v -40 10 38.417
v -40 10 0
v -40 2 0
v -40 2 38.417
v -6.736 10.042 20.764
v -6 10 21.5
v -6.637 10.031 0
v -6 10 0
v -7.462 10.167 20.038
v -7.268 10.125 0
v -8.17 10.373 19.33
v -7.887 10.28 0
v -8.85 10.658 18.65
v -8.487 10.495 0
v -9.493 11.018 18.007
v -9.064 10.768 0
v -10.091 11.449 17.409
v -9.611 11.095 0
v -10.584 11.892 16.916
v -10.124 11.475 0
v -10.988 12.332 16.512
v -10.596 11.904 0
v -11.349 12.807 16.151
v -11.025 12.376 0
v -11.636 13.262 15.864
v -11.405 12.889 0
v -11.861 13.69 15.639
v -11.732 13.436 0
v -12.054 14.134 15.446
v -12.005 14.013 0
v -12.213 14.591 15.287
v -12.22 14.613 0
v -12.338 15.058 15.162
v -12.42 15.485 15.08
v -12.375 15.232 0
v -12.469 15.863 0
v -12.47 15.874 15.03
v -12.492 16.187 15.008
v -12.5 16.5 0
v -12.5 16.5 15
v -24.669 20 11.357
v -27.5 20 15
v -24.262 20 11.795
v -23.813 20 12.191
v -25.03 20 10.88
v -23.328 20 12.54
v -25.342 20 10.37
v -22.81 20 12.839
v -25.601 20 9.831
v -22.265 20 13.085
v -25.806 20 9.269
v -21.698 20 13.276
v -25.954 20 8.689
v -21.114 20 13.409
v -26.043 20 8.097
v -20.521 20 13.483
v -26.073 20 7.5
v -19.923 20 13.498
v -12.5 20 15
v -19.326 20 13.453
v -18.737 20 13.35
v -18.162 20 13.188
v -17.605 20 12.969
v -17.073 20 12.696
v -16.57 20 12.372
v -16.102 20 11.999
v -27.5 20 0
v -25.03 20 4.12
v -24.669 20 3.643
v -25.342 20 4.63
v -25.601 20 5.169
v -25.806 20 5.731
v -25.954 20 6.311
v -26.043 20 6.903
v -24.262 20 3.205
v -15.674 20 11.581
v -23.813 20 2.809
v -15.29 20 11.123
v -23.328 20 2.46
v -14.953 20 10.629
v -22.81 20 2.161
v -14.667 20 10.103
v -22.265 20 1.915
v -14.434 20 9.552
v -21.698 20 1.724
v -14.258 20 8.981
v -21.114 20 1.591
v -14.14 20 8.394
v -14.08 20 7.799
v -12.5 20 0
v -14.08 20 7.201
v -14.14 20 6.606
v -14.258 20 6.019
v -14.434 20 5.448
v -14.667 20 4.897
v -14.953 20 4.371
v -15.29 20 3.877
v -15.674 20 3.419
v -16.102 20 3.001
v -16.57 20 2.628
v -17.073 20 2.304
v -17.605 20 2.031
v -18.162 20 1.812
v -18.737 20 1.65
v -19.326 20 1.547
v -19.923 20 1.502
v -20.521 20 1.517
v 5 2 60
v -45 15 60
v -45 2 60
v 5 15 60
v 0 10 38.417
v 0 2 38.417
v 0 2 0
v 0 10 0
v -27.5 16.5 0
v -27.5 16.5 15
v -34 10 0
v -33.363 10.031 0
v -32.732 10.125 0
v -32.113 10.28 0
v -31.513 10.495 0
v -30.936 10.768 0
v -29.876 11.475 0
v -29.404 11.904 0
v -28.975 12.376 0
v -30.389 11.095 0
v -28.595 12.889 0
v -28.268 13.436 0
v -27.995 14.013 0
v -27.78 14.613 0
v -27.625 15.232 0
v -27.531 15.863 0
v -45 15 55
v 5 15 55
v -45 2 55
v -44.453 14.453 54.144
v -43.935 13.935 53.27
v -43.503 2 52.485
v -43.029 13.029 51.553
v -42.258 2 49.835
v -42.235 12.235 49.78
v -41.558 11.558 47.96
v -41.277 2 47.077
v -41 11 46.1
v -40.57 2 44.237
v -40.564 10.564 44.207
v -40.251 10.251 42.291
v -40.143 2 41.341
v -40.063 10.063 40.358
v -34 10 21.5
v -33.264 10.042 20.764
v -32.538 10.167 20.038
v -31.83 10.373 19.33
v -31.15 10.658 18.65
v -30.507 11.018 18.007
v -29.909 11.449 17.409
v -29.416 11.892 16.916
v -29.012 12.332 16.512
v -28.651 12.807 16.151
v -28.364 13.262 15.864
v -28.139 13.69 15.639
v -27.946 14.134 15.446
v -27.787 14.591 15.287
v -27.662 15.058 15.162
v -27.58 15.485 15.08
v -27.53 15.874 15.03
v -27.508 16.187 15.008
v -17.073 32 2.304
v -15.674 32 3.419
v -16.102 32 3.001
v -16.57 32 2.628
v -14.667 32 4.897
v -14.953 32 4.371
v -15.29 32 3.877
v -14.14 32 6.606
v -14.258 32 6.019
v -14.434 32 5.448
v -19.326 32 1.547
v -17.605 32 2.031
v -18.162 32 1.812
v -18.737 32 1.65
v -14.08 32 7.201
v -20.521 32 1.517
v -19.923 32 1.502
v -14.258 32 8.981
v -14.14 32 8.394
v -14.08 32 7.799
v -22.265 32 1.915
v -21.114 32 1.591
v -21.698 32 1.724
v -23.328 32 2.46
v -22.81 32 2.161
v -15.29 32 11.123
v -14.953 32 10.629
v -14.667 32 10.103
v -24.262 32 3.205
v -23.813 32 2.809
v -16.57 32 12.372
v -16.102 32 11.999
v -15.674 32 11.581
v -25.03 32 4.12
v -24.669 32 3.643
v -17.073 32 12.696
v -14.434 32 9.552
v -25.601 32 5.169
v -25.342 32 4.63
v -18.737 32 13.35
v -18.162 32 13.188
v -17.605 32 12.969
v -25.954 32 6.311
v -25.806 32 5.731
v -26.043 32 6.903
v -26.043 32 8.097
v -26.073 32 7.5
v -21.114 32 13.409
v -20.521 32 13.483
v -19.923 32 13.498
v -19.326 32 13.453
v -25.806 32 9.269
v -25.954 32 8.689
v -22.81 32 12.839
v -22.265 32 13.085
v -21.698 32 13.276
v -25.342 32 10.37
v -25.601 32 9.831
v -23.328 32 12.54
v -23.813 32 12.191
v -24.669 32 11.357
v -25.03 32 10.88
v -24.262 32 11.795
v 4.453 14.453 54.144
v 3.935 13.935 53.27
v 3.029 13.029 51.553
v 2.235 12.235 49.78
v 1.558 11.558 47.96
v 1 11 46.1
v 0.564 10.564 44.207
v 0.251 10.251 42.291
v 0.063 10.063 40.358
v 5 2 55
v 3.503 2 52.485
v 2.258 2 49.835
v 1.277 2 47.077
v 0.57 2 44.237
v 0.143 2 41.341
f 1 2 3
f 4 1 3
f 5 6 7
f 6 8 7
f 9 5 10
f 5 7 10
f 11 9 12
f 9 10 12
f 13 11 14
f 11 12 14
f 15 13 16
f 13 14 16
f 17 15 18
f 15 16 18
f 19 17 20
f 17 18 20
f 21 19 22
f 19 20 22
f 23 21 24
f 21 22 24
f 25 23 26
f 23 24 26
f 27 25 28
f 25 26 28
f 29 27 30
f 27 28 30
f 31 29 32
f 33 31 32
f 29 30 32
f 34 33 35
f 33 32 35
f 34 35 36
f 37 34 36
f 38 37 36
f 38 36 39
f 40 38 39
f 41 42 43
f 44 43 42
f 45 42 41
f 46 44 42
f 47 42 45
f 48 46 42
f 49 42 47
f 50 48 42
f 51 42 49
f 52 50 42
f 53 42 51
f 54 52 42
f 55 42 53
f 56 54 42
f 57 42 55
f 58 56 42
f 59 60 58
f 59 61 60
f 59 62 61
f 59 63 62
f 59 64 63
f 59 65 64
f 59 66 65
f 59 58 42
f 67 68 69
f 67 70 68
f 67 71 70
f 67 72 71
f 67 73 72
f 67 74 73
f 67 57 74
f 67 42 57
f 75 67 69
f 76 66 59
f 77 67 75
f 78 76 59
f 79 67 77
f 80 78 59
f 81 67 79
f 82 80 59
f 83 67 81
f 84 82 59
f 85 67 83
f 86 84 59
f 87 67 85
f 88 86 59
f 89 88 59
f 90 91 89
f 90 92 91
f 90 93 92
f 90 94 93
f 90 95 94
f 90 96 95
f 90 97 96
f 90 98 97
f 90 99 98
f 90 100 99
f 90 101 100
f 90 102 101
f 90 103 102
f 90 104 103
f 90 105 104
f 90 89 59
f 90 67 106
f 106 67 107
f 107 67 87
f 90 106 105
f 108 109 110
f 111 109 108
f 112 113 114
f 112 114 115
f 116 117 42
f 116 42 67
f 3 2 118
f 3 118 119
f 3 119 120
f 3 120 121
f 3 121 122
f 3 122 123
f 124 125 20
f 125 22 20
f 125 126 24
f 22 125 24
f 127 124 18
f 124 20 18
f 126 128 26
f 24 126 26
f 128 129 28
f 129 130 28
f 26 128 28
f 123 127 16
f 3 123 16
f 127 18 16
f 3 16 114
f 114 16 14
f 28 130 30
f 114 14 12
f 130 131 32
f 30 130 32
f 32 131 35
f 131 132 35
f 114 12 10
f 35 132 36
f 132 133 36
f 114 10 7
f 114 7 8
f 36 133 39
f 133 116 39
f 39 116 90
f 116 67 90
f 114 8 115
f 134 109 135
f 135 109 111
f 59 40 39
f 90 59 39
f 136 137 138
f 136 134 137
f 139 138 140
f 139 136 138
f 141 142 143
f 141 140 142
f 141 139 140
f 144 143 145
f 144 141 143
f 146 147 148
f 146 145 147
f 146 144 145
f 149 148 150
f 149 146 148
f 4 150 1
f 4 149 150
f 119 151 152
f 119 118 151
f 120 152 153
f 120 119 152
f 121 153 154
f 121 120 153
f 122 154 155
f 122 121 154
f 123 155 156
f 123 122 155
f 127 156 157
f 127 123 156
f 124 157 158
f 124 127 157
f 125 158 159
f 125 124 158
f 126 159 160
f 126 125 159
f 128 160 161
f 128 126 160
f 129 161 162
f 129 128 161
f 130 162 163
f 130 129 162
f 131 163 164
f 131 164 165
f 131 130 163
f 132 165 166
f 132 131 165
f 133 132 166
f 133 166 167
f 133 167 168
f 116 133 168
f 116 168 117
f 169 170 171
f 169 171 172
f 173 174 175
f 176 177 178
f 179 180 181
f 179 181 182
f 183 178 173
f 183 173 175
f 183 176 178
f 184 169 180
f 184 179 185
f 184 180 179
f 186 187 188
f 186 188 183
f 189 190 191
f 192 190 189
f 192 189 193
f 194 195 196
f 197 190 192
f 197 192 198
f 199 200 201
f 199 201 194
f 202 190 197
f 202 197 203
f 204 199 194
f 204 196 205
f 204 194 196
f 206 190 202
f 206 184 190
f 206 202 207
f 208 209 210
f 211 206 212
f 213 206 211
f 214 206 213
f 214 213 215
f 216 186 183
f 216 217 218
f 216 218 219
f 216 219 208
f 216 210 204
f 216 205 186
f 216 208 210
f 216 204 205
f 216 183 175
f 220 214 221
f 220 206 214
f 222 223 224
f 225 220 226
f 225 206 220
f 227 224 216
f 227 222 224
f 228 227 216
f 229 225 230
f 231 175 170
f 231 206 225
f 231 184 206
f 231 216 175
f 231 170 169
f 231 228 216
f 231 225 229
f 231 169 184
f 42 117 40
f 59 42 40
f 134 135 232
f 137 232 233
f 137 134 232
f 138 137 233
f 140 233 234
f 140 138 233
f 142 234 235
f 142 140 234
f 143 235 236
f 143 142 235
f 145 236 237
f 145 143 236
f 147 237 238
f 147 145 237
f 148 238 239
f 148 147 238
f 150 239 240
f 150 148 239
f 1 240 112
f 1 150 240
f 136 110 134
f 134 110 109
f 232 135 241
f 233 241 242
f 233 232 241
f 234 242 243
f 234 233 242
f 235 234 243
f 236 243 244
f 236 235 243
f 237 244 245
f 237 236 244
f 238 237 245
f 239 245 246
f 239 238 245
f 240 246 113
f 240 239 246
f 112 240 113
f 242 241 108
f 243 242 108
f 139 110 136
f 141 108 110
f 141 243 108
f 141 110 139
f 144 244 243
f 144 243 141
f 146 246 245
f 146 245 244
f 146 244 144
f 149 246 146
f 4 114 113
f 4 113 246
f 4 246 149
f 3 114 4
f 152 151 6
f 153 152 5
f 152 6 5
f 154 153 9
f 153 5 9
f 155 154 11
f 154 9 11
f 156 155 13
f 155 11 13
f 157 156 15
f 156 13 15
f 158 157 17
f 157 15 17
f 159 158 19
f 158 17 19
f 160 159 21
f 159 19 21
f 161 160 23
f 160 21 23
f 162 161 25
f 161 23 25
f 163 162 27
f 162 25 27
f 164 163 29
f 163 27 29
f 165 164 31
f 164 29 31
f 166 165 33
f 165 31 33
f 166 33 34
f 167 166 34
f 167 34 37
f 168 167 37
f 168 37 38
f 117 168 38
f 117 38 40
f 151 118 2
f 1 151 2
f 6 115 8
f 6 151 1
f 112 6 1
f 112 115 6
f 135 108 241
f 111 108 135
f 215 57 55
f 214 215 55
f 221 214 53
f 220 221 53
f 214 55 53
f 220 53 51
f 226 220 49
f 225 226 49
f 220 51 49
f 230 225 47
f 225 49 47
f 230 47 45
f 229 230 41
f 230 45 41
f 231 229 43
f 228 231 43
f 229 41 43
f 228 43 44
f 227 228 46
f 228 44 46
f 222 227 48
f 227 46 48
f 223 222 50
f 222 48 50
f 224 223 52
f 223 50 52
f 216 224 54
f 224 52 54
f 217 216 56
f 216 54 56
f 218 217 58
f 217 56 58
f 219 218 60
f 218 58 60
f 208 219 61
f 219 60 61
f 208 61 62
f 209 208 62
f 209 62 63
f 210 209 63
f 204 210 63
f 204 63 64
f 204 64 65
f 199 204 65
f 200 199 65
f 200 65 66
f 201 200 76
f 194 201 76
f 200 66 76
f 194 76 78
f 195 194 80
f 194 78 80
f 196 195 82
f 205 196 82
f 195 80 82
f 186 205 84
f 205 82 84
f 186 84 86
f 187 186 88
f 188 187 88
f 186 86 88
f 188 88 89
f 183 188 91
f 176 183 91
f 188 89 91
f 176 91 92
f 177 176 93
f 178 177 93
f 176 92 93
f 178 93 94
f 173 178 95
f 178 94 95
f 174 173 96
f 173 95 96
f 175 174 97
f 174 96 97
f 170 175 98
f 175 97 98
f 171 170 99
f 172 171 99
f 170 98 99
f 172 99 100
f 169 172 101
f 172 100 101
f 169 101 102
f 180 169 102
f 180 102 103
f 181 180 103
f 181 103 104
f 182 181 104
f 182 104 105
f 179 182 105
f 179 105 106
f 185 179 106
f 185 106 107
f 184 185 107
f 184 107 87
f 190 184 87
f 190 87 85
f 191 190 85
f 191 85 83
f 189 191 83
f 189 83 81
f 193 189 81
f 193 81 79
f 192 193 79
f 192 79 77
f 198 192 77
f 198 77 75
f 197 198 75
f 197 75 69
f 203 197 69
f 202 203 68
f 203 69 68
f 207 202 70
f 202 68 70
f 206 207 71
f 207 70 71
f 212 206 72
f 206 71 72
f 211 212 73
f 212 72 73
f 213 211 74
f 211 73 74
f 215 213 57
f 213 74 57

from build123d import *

# Parameters (mm, degrees)
SKETCH5_W           = 40
SKETCH5_H           = 10
BOSS_EXTRUDE4_DEPTH = 60
SKETCH11_W          = 15
SKETCH11_H          = 15
BOSS_EXTRUDE6_DEPTH = 10
FILLET1_R           = 6.5
SKETCH14_W          = 50
SKETCH14_H          = 15
BOSS_EXTRUDE7_DEPTH = 5
FILLET2_R           = 30
SKETCH16_R          = 6
BOSS_EXTRUDE8_DEPTH = 12
SKETCH17_W          = 64.115547938
SKETCH17_H          = 89.863494167
CUT_EXTRUDE1_DEPTH  = 2


with BuildPart() as part:
    # Sketch5 → Boss-Extrude4 (new body)
    with BuildSketch(Plane.XY):
        with Locations((-20, 5)):
            Rectangle(SKETCH5_W, SKETCH5_H)
    extrude(amount=BOSS_EXTRUDE4_DEPTH)

    # Sketch11 → Boss-Extrude6 (add)
    with BuildSketch(Plane(origin=(0, 10, 0), x_dir=(1, 0, 0), z_dir=(0, 1, 0))):
        with Locations((-20, -7.5)):
            Rectangle(SKETCH11_W, SKETCH11_H)
    extrude(amount=BOSS_EXTRUDE6_DEPTH)

    # Fillet1
    fillet1_edges = [part.edges().sort_by_distance(p)[0] for p in [
        (-27.5, 10, 7.5),
        (-20, 10, 15),
        (-12.5, 10, 7.5),
    ]]
    fillet(fillet1_edges, radius=FILLET1_R)

    # Sketch14 → Boss-Extrude7 (add)
    with BuildSketch(Plane.XY.offset(60)):
        with Locations((-20, 7.5)):
            Rectangle(SKETCH14_W, SKETCH14_H)
    extrude(amount=-BOSS_EXTRUDE7_DEPTH)

    # Fillet2
    # the kernel refuses this fillet: 30 mm, written as the material it adds along each edge
    with BuildSketch(Plane(origin=(0, 10, 55), x_dir=(0, 0, -1), z_dir=(0, -1, 0))) as fillet2_piece_1:
        with BuildLine():
            CenterArc((16.583123952, 30), FILLET2_R, 236.442690238, 33.557309762)
            Line((0, 5), (-0.331662479, 4.5))
            ThreePointArc((-0.331662479, 4.5), (-0.6, 2.5), (-0.6, 0))
            Line((-0.6, 0), (0, -0.6))
            Line((0, -0.6), (16.583123952, -0.6))
            Line((16.583123952, -0.6), (16.583123952, 0))
        make_face()
    extrude(amount=10)
    with BuildSketch(Plane(origin=(-40, 10, 55), x_dir=(0, 1, 0), z_dir=(1, 0, 0))) as fillet2_piece_2:
        with BuildLine():
            CenterArc((30, -16.583123952), FILLET2_R, 146.442690238, 33.557309762)
            Line((0, -16.583123952), (-0.6, -16.583123952))
            Line((-0.6, -16.583123952), (-0.6, 0))
            Line((-0.6, 0), (0, 0.6))
            ThreePointArc((0, 0.6), (2.5, 0.6), (4.5, 0.331662479))
            Line((4.5, 0.331662479), (5, 0))
        make_face()
    extrude(amount=40)
    with BuildSketch(Plane(origin=(-40, 0, 55), x_dir=(-1, 0, 0), z_dir=(0, 1, 0))) as fillet2_piece_3:
        with BuildLine():
            CenterArc((30, -16.583123952), FILLET2_R, 146.442690238, 33.557309762)
            Line((0, -16.583123952), (-0.6, -16.583123952))
            Line((-0.6, -16.583123952), (-0.6, 0))
            Line((-0.6, 0), (0, 0.6))
            ThreePointArc((0, 0.6), (2.5, 0.6), (4.5, 0.331662479))
            Line((4.5, 0.331662479), (5, 0))
        make_face()
    extrude(amount=10)
    with BuildSketch(Plane(origin=(0, 51.457809879, 55), x_dir=(0, 0, -1), z_dir=(0, -1, 0))) as fillet2_piece_4a_section:
        with BuildLine():
            CenterArc((16.583123952, 30), FILLET2_R, 236.442690238, 33.557309762)
            Line((0, 5), (-0.331662479, 4.5))
            ThreePointArc((-0.331662479, 4.5), (-0.6, 2.5), (-0.6, 0))
            Line((-0.6, 0), (0, -0.6))
            Line((0, -0.6), (16.583123952, -0.6))
            Line((16.583123952, -0.6), (16.583123952, 0))
        make_face()
    fillet2_piece_4a = extrude(amount=51.457809879, mode=Mode.PRIVATE)
    fillet2_piece_4a = split(fillet2_piece_4a, bisect_by=Plane(origin=(1.065152115, 10, 50.172088022), z_dir=(0, 1, 0)), keep=Keep.TOP, mode=Mode.PRIVATE)
    fillet2_piece_4a = split(fillet2_piece_4a, bisect_by=Plane(origin=(1.065152115, 15, 50.172088022), z_dir=(0, -1, 0)), keep=Keep.TOP, mode=Mode.PRIVATE)
    with BuildSketch(Plane(origin=(-40, 10, 55), x_dir=(0, 1, 0), z_dir=(1, 0, 0))) as fillet2_piece_4b_section:
        with BuildLine():
            CenterArc((30, -16.583123952), FILLET2_R, 146.442690238, 33.557309762)
            Line((0, -16.583123952), (-0.6, -16.583123952))
            Line((-0.6, -16.583123952), (-0.6, 0))
            Line((-0.6, 0), (0, 0.6))
            ThreePointArc((0, 0.6), (2.5, 0.6), (4.5, 0.331662479))
            Line((4.5, 0.331662479), (5, 0))
        make_face()
    fillet2_piece_4b = extrude(amount=81.457809879, mode=Mode.PRIVATE)
    fillet2_piece_4b = split(fillet2_piece_4b, bisect_by=Plane(origin=(0, 11.065152115, 50.172088022), z_dir=(1, 0, 0)), keep=Keep.TOP, mode=Mode.PRIVATE)
    fillet2_piece_4b = split(fillet2_piece_4b, bisect_by=Plane(origin=(5, 11.065152115, 50.172088022), z_dir=(-1, 0, 0)), keep=Keep.TOP, mode=Mode.PRIVATE)
    fillet2_piece_4 = fillet2_piece_4a & fillet2_piece_4b
    add(fillet2_piece_4)
    with BuildSketch(Plane(origin=(-81.457809879, 10, 55), x_dir=(0, 1, 0), z_dir=(1, 0, 0))) as fillet2_piece_5a_section:
        with BuildLine():
            CenterArc((30, -16.583123952), FILLET2_R, 146.442690238, 33.557309762)
            Line((0, -16.583123952), (-0.6, -16.583123952))
            Line((-0.6, -16.583123952), (-0.6, 0))
            Line((-0.6, 0), (0, 0.6))
            ThreePointArc((0, 0.6), (2.5, 0.6), (4.5, 0.331662479))
            Line((4.5, 0.331662479), (5, 0))
        make_face()
    fillet2_piece_5a = extrude(amount=81.457809879, mode=Mode.PRIVATE)
    fillet2_piece_5a = split(fillet2_piece_5a, bisect_by=Plane(origin=(-45, 11.065152115, 50.172088022), z_dir=(1, 0, 0)), keep=Keep.TOP, mode=Mode.PRIVATE)
    fillet2_piece_5a = split(fillet2_piece_5a, bisect_by=Plane(origin=(-40, 11.065152115, 50.172088022), z_dir=(-1, 0, 0)), keep=Keep.TOP, mode=Mode.PRIVATE)
    with BuildSketch(Plane(origin=(-40, 0, 55), x_dir=(-1, 0, 0), z_dir=(0, 1, 0))) as fillet2_piece_5b_section:
        with BuildLine():
            CenterArc((30, -16.583123952), FILLET2_R, 146.442690238, 33.557309762)
            Line((0, -16.583123952), (-0.6, -16.583123952))
            Line((-0.6, -16.583123952), (-0.6, 0))
            Line((-0.6, 0), (0, 0.6))
            ThreePointArc((0, 0.6), (2.5, 0.6), (4.5, 0.331662479))
            Line((4.5, 0.331662479), (5, 0))
        make_face()
    fillet2_piece_5b = extrude(amount=51.457809879, mode=Mode.PRIVATE)
    fillet2_piece_5b = split(fillet2_piece_5b, bisect_by=Plane(origin=(-41.065152115, 15, 50.172088022), z_dir=(0, -1, 0)), keep=Keep.TOP, mode=Mode.PRIVATE)
    fillet2_piece_5b = split(fillet2_piece_5b, bisect_by=Plane(origin=(-41.065152115, 10, 50.172088022), z_dir=(0, 1, 0)), keep=Keep.TOP, mode=Mode.PRIVATE)
    fillet2_piece_5 = fillet2_piece_5a & fillet2_piece_5b
    add(fillet2_piece_5)

    # Sketch16 → Boss-Extrude8 (add)
    with BuildSketch(Plane(origin=(0, 20, 0), x_dir=(1, 0, 0), z_dir=(0, 1, 0))):
        with Locations(Location((-20.072505657, -7.5, 0), (0, 0, 180))):
            Circle(SKETCH16_R)
    extrude(amount=BOSS_EXTRUDE8_DEPTH)

    # Sketch17 → Cut-Extrude1 (cut)
    with BuildSketch(Plane(origin=(0, 0, 0), x_dir=(-1, 0, 0), z_dir=(0, -1, 0))):
        with Locations((20.527974447, -24.438192458)):
            Rectangle(SKETCH17_W, SKETCH17_H)
    extrude(amount=-CUT_EXTRUDE1_DEPTH, mode=Mode.SUBTRACT)


solid = part.part
